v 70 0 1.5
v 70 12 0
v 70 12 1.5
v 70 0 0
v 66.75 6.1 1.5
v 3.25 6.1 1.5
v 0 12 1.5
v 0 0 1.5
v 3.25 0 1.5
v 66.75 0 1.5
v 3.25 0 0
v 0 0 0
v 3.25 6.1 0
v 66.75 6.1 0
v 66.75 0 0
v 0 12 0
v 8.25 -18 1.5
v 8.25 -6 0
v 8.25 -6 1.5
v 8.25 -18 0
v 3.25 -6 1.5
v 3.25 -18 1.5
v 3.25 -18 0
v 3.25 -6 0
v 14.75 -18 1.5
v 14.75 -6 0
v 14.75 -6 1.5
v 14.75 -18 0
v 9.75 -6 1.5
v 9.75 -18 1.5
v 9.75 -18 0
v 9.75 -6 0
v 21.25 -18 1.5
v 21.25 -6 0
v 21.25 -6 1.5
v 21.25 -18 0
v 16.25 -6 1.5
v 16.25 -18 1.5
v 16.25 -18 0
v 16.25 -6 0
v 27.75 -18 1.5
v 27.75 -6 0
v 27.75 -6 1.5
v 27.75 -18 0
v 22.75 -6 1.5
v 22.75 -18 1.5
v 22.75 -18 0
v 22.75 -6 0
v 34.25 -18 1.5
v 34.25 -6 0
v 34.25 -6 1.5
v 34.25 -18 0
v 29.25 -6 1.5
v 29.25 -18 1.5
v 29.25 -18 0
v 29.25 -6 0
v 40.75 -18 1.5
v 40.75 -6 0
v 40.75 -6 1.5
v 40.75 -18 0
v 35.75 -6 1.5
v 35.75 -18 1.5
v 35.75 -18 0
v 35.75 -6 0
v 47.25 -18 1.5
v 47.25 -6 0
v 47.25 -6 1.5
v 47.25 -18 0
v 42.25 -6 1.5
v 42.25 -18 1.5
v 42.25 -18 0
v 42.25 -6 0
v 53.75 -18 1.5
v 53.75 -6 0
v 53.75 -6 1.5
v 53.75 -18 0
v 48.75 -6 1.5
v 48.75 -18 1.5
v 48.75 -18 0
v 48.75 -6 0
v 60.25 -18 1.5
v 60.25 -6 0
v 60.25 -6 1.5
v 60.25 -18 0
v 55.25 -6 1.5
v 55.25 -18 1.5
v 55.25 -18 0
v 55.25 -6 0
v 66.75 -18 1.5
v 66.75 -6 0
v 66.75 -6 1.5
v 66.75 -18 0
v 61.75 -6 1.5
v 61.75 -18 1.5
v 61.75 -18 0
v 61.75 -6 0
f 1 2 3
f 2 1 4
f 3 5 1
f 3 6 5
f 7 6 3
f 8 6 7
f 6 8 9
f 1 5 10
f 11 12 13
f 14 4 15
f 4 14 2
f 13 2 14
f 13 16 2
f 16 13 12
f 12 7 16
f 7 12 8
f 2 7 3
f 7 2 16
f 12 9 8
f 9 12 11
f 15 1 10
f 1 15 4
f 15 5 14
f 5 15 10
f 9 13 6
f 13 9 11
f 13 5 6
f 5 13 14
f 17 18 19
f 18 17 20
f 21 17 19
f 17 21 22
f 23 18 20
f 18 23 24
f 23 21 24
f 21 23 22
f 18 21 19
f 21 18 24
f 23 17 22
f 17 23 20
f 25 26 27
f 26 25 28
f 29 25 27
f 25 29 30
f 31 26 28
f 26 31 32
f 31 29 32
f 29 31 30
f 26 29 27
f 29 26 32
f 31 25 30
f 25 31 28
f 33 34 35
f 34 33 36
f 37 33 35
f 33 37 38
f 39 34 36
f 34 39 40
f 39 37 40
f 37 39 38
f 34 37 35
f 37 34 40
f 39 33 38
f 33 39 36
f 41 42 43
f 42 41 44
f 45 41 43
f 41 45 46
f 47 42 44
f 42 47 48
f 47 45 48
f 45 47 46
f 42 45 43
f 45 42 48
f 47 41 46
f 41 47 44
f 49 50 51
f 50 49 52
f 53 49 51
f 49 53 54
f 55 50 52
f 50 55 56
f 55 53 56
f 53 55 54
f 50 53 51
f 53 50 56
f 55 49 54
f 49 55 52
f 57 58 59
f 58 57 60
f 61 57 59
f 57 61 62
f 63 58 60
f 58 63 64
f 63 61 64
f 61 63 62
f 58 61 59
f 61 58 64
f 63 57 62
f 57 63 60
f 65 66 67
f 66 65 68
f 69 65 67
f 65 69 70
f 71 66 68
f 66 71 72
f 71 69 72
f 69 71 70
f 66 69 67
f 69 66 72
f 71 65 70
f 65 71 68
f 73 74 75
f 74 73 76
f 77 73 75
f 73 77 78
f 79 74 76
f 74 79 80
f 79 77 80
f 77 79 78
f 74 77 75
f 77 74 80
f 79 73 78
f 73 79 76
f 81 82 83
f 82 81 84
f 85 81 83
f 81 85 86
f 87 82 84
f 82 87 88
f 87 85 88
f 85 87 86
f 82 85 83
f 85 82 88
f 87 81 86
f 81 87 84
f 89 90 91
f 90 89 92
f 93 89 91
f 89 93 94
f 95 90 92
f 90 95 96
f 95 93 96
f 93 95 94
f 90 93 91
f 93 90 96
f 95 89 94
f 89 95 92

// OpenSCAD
// 10-well Agarose Gel Comb
// Designed for FDM printing, lying flat on the XY plane (Z=0).
// Dimensions in millimetres.

// --- Dimensions ---
$fn = 128; // High resolution for smooth edges

// Spine dimensions
SPINE_LENGTH = 70;   // X dimension
SPINE_WIDTH = 12;    // Y dimension
SPINE_THICKNESS = 1.5; // Z dimension

// Tooth dimensions
TOOTH_WIDTH = 5.0;   // X dimension
TOOTH_LENGTH = 12;   // Y dimension (extends from spine edge)
TOOTH_COUNT = 10;
TOOTH_GAP = 1.5;     // Gap between teeth

// --- Calculations ---
// Total width of the tooth row
TOOTH_ROW_WIDTH = (TOOTH_COUNT * TOOTH_WIDTH) + ((TOOTH_COUNT - 1) * TOOTH_GAP);

// Offset to center the tooth row on the spine in X
X_OFFSET = (SPINE_LENGTH - TOOTH_ROW_WIDTH) / 2;

// Position of the spine edge from which teeth hang (-Y direction)
// Spine is centered in Y, so edge is at -SPINE_WIDTH/2
SPINE_EDGE_Y = -SPINE_WIDTH / 2;

// --- Main Body (Spine) ---
// Create the main rectangular block
difference() {
    // Main spine block
    translate([0, 0, 0])
        cube([SPINE_LENGTH, SPINE_WIDTH, SPINE_THICKNESS]);
    
    // Cut out the area where teeth will be attached to create a clean separation
    // We cut a rectangle slightly larger than the tooth row to ensure separation
    translate([X_OFFSET, SPINE_EDGE_Y, 0])
        cube([TOOTH_ROW_WIDTH, TOOTH_LENGTH + 0.1, SPINE_THICKNESS + 0.1]);
}

// --- Teeth ---
// Loop to create each tooth hanging from the spine
for (i = [0 : TOOTH_COUNT - 1]) {
    // Calculate X position for this tooth
    // Start at X_OFFSET, add (i * (width + gap))
    current_x = X_OFFSET + (i * (TOOTH_WIDTH + TOOTH_GAP));
    
    // Calculate Y position for this tooth
    // Starts at the spine edge (SPINE_EDGE_Y) and extends in -Y direction
    current_y = SPINE_EDGE_Y - TOOTH_LENGTH;
    
    // Tooth geometry
    translate([current_x, current_y, 0])
        cube([TOOTH_WIDTH, TOOTH_LENGTH, SPINE_THICKNESS]);
}
